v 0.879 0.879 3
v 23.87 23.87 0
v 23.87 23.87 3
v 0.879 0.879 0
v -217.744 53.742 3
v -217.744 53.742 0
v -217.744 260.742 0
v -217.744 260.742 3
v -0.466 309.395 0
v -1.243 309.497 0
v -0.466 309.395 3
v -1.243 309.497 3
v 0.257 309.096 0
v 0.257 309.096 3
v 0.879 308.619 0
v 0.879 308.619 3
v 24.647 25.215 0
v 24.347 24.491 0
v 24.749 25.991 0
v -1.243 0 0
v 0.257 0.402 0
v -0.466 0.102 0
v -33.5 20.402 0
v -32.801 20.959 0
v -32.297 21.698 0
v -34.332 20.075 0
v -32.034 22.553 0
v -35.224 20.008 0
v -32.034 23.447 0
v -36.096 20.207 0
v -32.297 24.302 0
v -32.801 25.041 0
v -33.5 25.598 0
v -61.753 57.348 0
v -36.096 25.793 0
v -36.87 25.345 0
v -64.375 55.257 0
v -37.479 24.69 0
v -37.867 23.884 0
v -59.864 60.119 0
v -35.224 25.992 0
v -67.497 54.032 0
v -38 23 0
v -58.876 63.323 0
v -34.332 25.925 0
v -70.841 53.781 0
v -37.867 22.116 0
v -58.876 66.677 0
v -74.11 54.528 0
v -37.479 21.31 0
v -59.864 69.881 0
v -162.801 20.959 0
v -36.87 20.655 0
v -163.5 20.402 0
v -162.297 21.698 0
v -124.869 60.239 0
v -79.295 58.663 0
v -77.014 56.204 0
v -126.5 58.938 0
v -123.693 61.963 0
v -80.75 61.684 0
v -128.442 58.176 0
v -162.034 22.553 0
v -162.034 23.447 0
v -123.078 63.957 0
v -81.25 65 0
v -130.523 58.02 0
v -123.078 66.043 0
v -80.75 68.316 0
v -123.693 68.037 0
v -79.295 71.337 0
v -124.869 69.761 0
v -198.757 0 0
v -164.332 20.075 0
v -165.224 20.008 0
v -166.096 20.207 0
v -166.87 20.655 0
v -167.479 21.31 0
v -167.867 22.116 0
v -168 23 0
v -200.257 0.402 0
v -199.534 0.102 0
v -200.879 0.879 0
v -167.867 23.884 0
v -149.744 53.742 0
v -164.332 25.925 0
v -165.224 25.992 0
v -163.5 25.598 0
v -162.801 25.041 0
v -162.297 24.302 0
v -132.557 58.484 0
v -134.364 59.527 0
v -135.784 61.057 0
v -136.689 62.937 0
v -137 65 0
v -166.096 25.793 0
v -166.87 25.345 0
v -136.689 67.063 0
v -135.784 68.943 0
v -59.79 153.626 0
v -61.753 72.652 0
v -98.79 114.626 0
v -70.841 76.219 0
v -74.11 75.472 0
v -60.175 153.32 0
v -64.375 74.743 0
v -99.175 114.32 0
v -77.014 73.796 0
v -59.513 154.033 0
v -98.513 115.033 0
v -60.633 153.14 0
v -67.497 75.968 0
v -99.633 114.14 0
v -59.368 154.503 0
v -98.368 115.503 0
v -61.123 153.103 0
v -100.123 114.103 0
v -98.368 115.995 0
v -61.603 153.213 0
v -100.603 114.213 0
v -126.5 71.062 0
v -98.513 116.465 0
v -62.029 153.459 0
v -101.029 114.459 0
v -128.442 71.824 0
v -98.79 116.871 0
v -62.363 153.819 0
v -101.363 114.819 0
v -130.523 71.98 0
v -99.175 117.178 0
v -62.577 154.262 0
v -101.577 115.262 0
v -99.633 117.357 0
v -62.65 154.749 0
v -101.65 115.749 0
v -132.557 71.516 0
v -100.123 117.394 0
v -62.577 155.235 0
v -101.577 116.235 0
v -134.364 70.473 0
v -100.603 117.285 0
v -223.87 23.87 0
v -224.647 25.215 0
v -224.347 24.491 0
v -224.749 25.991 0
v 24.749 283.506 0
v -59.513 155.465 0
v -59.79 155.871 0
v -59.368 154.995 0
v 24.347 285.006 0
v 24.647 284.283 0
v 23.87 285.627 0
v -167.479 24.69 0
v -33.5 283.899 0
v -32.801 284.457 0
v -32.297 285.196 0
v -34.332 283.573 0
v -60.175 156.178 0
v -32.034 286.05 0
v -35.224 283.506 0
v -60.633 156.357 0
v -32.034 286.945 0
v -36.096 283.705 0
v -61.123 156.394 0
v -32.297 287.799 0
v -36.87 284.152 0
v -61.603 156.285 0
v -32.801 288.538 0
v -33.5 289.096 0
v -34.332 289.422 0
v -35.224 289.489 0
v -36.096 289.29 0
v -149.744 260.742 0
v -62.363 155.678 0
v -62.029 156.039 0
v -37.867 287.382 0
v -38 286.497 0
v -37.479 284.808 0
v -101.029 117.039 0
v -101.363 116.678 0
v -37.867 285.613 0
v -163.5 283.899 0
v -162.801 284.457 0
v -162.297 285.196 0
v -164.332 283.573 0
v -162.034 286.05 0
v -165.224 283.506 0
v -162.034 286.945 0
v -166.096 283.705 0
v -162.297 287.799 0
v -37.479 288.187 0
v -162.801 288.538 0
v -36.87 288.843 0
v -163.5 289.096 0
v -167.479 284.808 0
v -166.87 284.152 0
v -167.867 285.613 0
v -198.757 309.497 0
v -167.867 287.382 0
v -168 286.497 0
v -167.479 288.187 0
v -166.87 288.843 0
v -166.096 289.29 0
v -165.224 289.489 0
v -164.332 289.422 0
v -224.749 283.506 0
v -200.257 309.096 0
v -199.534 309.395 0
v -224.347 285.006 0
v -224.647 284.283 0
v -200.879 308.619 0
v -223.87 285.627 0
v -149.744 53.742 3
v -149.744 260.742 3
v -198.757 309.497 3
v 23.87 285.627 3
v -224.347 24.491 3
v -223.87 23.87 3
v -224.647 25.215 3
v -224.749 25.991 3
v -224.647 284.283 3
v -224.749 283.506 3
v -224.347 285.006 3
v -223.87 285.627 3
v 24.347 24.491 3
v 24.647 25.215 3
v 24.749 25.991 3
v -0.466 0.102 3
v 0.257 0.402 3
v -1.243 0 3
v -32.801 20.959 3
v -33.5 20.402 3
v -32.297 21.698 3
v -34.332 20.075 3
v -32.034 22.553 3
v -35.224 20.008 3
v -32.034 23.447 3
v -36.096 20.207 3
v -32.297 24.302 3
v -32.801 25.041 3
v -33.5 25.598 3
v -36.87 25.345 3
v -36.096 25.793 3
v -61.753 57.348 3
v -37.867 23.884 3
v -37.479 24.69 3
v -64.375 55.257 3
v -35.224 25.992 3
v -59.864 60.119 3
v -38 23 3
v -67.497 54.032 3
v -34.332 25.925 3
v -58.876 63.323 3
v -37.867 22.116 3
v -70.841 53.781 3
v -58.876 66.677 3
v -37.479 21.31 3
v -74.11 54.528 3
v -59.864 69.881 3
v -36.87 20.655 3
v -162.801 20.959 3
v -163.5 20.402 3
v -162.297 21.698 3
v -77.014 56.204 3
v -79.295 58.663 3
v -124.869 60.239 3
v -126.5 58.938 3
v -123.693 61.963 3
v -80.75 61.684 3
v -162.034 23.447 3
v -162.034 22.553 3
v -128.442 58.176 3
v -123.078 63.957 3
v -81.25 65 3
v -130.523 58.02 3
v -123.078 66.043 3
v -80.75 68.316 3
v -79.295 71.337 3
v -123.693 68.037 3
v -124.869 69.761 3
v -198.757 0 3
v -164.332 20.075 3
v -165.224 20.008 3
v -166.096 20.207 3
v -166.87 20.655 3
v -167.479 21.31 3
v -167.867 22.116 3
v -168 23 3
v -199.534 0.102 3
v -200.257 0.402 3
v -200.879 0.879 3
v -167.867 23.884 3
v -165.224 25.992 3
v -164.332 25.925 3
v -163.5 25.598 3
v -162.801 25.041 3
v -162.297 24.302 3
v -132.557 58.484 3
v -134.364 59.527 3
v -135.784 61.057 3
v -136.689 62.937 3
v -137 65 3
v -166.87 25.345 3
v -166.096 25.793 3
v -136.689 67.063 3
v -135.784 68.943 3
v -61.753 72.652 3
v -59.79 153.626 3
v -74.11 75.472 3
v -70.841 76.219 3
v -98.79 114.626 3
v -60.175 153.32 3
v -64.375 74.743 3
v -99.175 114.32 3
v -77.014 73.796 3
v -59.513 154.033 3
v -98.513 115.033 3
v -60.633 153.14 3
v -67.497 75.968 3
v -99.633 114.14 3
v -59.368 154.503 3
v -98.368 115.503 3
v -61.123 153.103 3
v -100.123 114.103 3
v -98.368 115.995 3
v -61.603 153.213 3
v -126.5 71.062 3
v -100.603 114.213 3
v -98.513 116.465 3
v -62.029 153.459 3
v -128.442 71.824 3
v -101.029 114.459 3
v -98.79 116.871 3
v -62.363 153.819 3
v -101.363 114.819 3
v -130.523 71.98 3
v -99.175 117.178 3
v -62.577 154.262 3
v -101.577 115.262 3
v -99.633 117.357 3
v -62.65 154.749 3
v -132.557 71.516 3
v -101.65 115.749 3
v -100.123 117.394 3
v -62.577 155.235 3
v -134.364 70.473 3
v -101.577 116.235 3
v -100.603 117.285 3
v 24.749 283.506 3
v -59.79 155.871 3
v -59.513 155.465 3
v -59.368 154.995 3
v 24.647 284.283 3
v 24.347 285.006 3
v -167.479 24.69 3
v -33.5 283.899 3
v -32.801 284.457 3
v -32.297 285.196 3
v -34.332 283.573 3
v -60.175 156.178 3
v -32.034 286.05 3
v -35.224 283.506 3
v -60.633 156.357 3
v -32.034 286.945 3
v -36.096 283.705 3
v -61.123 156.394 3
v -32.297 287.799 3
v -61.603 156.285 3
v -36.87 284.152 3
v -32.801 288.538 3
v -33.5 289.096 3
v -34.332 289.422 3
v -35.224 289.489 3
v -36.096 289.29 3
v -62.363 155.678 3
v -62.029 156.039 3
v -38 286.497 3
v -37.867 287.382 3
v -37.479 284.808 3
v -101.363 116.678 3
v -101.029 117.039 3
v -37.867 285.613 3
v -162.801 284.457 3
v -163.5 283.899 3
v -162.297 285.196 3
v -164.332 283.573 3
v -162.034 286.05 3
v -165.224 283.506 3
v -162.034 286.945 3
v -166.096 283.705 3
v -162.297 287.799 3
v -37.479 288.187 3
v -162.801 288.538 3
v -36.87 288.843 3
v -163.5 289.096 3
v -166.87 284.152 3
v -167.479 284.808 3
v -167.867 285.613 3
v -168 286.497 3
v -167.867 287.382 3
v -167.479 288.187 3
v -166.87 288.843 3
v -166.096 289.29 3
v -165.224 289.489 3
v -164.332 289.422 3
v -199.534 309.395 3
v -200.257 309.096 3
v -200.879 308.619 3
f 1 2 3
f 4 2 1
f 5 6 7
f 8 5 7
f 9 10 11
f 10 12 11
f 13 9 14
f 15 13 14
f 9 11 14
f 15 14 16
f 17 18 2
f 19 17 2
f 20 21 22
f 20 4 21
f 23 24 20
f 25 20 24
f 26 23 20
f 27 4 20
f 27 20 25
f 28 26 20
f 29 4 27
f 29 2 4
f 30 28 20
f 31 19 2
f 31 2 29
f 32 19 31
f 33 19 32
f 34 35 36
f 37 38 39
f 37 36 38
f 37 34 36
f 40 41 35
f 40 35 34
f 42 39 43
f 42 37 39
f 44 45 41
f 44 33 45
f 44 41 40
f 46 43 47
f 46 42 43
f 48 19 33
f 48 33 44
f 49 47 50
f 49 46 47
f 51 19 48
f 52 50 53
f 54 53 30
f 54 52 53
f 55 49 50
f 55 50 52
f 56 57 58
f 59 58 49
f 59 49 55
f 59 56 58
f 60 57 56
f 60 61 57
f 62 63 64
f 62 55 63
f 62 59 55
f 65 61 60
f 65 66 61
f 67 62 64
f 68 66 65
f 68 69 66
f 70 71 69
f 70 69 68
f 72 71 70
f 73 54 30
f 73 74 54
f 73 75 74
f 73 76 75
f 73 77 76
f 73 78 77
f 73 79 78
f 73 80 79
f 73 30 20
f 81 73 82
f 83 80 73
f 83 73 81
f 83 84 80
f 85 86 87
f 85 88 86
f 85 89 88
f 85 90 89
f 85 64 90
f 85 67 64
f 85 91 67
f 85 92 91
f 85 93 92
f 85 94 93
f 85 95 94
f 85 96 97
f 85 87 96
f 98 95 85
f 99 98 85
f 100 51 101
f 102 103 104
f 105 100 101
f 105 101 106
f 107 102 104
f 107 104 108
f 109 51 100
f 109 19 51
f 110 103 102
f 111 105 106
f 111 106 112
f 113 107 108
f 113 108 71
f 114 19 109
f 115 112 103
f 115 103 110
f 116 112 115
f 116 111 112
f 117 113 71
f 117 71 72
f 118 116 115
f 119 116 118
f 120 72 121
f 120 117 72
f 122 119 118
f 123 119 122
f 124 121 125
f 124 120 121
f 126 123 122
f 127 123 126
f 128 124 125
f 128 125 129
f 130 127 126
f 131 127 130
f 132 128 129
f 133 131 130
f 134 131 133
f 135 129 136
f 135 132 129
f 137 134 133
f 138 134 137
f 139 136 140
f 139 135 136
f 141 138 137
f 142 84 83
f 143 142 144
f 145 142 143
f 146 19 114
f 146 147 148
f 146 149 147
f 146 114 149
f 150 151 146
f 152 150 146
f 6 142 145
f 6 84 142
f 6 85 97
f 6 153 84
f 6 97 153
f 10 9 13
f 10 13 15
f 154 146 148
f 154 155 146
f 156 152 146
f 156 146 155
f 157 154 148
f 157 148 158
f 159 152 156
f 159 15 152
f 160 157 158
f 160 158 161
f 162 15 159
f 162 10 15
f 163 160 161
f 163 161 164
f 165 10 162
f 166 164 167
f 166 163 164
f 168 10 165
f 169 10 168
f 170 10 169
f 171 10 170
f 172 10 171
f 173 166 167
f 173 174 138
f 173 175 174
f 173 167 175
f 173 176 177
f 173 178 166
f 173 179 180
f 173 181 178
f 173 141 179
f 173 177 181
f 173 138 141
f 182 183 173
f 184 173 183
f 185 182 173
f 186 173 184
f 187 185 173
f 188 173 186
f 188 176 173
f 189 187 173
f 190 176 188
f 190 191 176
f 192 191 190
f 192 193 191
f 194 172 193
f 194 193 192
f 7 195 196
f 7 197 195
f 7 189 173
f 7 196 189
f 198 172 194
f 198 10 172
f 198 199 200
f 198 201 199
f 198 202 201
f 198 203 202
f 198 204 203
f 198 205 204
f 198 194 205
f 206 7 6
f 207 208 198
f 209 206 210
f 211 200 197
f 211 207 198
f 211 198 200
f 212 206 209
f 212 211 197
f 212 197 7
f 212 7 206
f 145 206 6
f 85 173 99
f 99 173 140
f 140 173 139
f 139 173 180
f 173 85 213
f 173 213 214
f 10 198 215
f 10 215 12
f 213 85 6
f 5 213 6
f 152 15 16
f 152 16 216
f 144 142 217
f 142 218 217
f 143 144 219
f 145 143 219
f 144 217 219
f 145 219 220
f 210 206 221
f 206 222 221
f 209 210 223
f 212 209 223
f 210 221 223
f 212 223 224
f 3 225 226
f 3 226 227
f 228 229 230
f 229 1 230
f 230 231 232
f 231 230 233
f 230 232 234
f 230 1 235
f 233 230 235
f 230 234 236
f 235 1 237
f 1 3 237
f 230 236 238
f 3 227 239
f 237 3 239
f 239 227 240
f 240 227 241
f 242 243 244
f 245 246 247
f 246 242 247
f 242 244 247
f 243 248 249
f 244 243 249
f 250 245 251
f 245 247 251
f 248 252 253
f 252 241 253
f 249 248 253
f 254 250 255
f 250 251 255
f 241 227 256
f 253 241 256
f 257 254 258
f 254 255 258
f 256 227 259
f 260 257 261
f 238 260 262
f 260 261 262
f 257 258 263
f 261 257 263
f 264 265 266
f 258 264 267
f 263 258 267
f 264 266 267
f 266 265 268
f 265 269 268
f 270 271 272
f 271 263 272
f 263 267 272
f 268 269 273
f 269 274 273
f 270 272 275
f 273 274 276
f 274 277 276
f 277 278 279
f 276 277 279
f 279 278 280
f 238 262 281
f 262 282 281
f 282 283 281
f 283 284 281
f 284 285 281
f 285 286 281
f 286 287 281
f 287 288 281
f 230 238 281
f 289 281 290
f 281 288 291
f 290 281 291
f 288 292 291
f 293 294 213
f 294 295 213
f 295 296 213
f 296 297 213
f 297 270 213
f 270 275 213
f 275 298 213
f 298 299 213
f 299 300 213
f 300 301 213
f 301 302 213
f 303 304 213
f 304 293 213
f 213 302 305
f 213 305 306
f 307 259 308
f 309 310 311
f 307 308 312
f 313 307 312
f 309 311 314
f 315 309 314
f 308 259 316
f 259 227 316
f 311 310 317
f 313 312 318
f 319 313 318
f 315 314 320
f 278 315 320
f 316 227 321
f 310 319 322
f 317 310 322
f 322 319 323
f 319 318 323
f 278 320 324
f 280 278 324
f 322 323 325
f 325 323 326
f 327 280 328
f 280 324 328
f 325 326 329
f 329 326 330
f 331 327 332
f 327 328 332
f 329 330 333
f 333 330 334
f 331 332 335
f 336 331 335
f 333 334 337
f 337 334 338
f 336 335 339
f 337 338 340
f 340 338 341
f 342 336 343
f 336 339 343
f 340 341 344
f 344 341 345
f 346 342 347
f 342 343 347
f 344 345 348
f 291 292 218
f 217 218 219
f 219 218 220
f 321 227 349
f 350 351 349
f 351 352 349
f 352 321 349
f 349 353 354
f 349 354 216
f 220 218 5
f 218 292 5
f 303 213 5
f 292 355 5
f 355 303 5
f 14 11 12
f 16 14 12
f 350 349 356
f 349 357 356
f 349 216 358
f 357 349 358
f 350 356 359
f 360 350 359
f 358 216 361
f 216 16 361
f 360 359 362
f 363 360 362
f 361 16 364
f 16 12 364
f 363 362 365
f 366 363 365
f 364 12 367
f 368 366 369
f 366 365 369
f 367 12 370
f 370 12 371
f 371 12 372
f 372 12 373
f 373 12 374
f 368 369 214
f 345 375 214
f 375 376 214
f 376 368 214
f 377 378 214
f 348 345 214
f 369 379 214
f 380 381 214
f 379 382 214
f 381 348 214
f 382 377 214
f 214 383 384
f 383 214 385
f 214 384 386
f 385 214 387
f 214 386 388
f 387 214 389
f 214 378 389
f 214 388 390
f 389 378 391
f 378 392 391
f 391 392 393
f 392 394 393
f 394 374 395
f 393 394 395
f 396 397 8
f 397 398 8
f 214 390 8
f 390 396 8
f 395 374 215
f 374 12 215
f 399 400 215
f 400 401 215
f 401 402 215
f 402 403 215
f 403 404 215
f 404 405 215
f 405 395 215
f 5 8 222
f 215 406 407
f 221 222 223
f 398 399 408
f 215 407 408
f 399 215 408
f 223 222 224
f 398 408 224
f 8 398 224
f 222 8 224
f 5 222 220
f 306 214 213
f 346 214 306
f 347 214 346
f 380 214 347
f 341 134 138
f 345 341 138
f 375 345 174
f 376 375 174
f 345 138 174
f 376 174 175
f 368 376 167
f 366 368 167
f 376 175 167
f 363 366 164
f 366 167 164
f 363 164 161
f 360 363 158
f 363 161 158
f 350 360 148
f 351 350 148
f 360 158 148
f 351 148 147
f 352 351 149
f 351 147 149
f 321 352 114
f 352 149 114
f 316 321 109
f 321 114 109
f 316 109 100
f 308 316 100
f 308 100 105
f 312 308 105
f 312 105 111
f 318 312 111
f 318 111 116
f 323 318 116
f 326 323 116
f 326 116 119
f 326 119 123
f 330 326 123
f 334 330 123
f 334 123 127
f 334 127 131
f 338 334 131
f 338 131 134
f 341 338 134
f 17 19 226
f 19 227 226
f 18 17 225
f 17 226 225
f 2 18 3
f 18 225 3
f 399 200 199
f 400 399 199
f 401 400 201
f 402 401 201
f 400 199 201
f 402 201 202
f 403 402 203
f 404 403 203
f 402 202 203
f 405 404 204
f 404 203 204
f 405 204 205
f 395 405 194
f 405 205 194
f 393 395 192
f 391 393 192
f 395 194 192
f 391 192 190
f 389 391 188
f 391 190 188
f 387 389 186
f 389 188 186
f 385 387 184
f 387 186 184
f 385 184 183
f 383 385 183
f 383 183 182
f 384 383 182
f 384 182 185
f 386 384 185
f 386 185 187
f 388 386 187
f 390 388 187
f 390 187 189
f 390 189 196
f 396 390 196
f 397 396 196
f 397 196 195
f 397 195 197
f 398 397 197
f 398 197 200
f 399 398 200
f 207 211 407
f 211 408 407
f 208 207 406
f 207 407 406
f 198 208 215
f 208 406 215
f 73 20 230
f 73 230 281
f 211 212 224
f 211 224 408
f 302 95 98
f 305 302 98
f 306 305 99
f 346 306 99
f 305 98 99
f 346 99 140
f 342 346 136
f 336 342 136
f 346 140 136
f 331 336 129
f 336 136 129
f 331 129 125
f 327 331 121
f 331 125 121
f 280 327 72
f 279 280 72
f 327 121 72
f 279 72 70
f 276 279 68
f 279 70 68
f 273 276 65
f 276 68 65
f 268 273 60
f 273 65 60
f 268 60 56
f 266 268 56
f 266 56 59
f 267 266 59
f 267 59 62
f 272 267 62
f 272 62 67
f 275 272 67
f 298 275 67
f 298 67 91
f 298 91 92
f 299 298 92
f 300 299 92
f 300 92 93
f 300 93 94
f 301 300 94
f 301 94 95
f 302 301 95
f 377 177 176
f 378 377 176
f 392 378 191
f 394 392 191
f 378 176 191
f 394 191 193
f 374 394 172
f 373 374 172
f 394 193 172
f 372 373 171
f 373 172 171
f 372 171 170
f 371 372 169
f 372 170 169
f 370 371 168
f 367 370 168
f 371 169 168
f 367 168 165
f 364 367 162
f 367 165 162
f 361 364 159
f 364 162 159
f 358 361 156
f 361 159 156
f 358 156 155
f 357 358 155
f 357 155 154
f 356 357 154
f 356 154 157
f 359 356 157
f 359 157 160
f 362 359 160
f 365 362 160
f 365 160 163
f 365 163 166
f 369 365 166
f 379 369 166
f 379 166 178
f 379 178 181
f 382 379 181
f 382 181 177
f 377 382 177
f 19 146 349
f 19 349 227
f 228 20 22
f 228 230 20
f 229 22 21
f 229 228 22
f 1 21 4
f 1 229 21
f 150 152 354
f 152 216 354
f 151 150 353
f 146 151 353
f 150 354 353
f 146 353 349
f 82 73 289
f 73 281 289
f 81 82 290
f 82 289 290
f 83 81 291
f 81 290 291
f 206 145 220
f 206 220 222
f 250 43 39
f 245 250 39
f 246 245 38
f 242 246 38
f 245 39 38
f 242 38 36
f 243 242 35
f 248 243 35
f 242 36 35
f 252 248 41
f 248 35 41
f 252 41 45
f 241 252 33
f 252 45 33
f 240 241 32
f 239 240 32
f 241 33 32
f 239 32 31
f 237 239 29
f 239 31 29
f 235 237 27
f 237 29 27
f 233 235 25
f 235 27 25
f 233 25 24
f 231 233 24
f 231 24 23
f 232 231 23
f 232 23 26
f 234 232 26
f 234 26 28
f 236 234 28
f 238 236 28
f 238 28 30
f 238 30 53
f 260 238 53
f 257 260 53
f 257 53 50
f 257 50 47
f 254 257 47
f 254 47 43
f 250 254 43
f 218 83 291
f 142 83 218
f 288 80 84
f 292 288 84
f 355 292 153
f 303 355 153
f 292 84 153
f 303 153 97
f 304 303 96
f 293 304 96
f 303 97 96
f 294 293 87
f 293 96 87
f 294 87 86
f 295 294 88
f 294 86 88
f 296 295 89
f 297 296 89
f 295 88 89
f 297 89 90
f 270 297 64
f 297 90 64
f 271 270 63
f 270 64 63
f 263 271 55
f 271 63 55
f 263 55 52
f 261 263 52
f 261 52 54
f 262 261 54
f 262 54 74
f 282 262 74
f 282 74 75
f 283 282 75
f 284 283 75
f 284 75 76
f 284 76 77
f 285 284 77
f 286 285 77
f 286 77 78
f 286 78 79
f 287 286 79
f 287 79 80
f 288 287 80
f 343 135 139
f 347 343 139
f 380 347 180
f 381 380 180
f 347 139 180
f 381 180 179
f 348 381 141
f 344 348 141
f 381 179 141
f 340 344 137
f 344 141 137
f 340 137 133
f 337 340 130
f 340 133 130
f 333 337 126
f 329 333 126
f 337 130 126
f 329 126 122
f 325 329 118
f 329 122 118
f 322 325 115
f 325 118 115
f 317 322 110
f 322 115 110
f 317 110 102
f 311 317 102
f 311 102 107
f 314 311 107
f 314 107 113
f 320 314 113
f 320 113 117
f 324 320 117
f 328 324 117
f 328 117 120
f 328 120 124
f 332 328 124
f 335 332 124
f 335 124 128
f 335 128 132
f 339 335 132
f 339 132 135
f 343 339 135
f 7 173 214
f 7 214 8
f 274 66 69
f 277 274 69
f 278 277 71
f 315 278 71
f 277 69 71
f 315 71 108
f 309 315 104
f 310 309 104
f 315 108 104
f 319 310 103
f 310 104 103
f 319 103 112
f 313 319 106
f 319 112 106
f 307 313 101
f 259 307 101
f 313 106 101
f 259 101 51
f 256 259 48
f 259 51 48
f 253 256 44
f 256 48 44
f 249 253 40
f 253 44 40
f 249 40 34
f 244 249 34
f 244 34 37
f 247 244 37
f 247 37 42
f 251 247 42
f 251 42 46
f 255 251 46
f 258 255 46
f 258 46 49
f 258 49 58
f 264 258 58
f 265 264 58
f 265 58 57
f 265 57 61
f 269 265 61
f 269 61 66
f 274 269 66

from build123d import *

# Parameters (mm, degrees)
BASE_DEPTH                     = 3
CONG_1_R                       = 3
ESQUISSE20_R                   = 3
PER_AGE_PROFIL_S_DEPTH         = 4
ESQUISSE21_R                   = 1.65
PER_AGE_LIDAR_DEPTH            = 4
ESQUISSE22_R                   = 11.25
PER_AGE_ARRET_D_URGENCE_DEPTH  = 4
ESQUISSE23_R                   = 7
PER_AGE_TIRETTE_DEPTH          = 4
ESQUISSE24_W                   = 68
ESQUISSE24_H                   = 207
PER_AGE_CABLE_MANAGEMENT_DEPTH = 4


with BuildPart() as part:
    # Esquisse1 → Base (new body)
    with BuildSketch(Plane.XY):
        Polygon((0, 0), (-200, 0), (-224.748737342, 24.748737342), (-224.748737342, 284.748737342), (-200, 309.497474683), (0, 309.497474683), (24.748737342, 284.748737342), (24.748737342, 24.748737342), align=None)
    extrude(amount=BASE_DEPTH)

    # Congé1
    cong_1_edges = [part.edges().sort_by_distance(p)[0] for p in [
        (0, 0, 1.5),
        (-200, 0, 1.5),
        (-224.748737342, 24.748737342, 1.5),
        (-224.748737342, 284.748737342, 1.5),
        (-200, 309.497474683, 1.5),
        (0, 309.497474683, 1.5),
        (24.748737342, 284.748737342, 1.5),
        (24.748737342, 24.748737342, 1.5),
    ]]
    fillet(cong_1_edges, radius=CONG_1_R)

    # Esquisse20 → Perçage Profilés (cut, through all)
    with BuildSketch(Plane(origin=(0, 0, 0), x_dir=(-1, 0, 0), z_dir=(0, 0, -1))):
        with Locations((35, 286.497474683)):
            Circle(ESQUISSE20_R)
        with Locations((165, 286.497474683)):
            Circle(ESQUISSE20_R)
        with Locations((165, 23)):
            Circle(ESQUISSE20_R)
        with Locations((35, 23)):
            Circle(ESQUISSE20_R)
    extrude(amount=-PER_AGE_PROFIL_S_DEPTH, mode=Mode.SUBTRACT)

    # Esquisse21 → Perçage Lidar (cut, through all)
    with BuildSketch(Plane(origin=(0, 0, 0), x_dir=(-1, 0, 0), z_dir=(0, 0, -1))):
        with Locations((61, 154.748737342)):
            Circle(ESQUISSE21_R)
        with Locations((100, 115.748737342)):
            Circle(ESQUISSE21_R)
    extrude(amount=-PER_AGE_LIDAR_DEPTH, mode=Mode.SUBTRACT)

    # Esquisse22 → Perçage Arret d'urgence (cut, through all)
    with BuildSketch(Plane(origin=(0, 0, 0), x_dir=(-1, 0, 0), z_dir=(0, 0, -1))):
        with Locations((70, 65)):
            Circle(ESQUISSE22_R)
    extrude(amount=-PER_AGE_ARRET_D_URGENCE_DEPTH, mode=Mode.SUBTRACT)

    # Esquisse23 → Perçage Tirette (cut, through all)
    with BuildSketch(Plane(origin=(0, 0, 0), x_dir=(-1, 0, 0), z_dir=(0, 0, -1))):
        with Locations((130, 65)):
            Circle(ESQUISSE23_R)
    extrude(amount=-PER_AGE_TIRETTE_DEPTH, mode=Mode.SUBTRACT)

    # Esquisse24 → Perçage Cable management (cut, through all)
    with BuildSketch(Plane(origin=(0, 0, 0), x_dir=(-1, 0, 0), z_dir=(0, 0, -1))):
        with Locations((183.744364822, 157.241556094)):
            Rectangle(ESQUISSE24_W, ESQUISSE24_H)
    extrude(amount=-PER_AGE_CABLE_MANAGEMENT_DEPTH, mode=Mode.SUBTRACT)


solid = part.part
